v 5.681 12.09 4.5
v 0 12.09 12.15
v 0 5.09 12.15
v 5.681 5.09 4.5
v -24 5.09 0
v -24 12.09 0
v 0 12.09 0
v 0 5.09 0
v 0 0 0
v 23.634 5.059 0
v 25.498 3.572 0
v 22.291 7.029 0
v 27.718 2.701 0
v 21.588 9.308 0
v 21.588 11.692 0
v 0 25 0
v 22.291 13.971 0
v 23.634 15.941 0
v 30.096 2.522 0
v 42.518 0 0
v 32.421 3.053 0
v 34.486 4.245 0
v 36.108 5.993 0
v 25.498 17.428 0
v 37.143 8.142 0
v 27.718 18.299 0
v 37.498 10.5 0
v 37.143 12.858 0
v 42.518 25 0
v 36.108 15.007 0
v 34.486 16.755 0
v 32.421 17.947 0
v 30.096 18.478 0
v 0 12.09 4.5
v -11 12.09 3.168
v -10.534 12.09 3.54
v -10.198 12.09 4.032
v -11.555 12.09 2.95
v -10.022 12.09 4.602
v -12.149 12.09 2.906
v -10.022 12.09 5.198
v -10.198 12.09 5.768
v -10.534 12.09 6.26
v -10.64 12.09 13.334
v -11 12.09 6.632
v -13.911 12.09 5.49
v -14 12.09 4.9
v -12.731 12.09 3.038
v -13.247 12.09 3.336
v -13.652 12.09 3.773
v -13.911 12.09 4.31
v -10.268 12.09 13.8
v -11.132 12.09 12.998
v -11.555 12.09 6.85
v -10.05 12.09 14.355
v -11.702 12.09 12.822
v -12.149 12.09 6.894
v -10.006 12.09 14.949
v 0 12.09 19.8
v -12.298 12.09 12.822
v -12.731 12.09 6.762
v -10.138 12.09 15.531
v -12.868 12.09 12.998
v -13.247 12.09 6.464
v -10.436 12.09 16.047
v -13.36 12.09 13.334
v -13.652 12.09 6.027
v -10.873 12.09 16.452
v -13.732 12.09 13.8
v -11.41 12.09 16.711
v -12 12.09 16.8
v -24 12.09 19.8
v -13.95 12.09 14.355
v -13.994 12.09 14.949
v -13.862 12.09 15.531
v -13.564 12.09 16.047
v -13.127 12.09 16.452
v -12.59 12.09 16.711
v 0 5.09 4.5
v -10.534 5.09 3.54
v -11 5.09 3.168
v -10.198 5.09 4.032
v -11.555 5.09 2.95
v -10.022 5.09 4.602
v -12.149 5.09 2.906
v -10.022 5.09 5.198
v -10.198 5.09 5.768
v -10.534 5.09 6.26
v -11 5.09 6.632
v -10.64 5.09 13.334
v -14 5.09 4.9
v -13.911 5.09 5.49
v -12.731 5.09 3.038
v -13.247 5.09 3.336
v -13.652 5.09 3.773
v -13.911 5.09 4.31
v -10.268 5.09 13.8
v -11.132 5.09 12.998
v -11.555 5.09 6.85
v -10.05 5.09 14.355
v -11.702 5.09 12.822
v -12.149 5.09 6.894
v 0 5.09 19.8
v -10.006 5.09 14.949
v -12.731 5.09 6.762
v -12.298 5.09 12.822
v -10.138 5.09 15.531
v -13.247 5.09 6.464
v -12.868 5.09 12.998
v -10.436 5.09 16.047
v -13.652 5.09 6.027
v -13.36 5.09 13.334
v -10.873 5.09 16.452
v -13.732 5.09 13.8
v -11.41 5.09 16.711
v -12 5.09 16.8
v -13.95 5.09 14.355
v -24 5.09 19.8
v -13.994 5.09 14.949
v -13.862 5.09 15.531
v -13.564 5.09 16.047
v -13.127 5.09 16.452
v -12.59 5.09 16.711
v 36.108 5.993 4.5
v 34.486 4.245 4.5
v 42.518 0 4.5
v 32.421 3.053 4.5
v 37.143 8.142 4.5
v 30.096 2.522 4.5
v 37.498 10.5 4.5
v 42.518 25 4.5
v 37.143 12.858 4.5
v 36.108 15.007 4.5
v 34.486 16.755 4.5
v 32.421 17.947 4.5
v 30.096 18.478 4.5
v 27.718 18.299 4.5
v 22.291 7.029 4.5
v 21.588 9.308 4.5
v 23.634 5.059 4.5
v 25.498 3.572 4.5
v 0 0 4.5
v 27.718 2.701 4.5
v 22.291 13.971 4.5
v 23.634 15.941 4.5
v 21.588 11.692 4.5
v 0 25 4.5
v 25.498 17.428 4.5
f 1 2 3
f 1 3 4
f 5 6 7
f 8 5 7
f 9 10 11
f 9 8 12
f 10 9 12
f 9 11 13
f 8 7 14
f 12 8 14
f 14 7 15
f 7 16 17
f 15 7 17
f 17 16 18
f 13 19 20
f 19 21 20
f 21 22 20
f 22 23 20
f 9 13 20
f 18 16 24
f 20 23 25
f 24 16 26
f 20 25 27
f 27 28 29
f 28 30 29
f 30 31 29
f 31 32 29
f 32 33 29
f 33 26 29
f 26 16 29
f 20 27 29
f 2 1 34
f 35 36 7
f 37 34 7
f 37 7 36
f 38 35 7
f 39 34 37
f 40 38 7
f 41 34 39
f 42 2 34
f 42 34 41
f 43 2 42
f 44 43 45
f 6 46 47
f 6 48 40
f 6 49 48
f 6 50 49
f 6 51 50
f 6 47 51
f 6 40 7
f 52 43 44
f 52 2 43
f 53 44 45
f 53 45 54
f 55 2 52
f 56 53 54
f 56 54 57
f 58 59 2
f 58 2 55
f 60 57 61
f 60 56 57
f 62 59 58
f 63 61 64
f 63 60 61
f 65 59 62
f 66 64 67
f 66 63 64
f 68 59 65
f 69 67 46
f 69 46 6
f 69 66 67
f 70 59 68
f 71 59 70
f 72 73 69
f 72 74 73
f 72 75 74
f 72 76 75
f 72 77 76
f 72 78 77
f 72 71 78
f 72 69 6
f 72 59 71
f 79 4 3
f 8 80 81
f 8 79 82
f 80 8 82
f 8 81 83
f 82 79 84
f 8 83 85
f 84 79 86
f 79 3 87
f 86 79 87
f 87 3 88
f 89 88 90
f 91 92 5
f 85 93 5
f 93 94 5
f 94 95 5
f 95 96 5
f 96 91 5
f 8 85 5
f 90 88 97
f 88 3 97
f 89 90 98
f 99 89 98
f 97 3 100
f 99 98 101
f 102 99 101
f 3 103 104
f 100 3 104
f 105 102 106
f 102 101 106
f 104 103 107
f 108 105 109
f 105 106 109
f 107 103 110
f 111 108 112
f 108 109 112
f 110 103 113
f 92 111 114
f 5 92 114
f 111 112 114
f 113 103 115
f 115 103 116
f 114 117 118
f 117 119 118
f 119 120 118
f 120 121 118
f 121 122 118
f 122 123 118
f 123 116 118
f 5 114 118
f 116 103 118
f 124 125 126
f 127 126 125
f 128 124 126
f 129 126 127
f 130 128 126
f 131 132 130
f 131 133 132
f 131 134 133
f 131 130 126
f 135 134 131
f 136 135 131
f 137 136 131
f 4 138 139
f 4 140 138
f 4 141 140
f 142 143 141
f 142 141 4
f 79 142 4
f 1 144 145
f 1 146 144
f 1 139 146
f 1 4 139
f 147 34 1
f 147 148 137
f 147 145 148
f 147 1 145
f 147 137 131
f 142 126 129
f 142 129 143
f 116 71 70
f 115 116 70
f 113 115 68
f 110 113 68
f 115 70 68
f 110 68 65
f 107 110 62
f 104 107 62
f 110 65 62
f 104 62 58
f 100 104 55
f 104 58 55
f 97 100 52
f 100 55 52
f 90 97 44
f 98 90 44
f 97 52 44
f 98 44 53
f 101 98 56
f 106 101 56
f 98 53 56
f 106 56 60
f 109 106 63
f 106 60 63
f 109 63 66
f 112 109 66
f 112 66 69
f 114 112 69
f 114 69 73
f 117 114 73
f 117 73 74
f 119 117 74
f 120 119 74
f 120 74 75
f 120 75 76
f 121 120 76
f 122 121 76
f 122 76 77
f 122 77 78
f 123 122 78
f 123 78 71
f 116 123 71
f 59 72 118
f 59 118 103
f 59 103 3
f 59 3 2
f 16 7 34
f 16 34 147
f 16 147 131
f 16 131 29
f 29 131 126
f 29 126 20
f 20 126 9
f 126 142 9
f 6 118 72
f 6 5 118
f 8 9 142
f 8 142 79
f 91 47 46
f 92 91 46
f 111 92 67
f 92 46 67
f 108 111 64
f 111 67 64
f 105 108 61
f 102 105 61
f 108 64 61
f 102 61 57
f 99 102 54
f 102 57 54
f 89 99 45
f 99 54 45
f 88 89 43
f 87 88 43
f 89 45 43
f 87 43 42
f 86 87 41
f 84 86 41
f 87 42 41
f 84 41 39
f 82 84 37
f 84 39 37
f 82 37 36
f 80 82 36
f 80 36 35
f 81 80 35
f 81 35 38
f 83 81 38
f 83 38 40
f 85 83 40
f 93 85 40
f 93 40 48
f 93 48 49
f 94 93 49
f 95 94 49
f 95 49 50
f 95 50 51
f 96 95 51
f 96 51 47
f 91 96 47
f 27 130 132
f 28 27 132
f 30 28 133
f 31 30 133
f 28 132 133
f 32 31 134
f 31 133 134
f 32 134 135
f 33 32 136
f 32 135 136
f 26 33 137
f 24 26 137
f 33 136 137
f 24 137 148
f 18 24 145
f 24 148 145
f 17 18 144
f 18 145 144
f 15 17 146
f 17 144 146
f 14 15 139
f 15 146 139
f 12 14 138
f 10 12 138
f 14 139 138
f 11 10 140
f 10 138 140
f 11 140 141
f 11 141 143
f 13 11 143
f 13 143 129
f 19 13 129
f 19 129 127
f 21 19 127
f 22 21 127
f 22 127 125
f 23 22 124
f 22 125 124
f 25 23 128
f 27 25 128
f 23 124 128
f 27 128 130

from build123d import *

# Parameters (mm, degrees)
SKETCH1_R                 = 11
SKETCH1_R_2               = 8
BOSS_EXTRUDE1_DEPTH       = 4.8
SKETCH2_W                 = 44.821432693
SKETCH2_H                 = 40.097165435
SKETCH2_R                 = 11
BOSS_EXTRUDE2_DEPTH       = 8.2
SKETCH3_W                 = 24
SKETCH3_H                 = 15
SKETCH3_R                 = 8
BOSS_EXTRUDE3_DEPTH       = 5
BOSS_EXTRUDE4_OUTLINE_W   = 48.178567307
BOSS_EXTRUDE4_OUTLINE_H   = 40.5
BOSS_EXTRUDE4_OUTLINE_R   = 1.6
BOSS_EXTRUDE4_OUTLINE_R_2 = 6.35
BOSS_EXTRUDE4_OUTLINE_R_3 = 2.1
BOSS_EXTRUDE4_DEPTH       = 5
BOSS_EXTRUDE5_DEPTH       = 5
SKETCH6_W                 = 48.178567307
SKETCH6_H                 = 17.568704936
BOSS_EXTRUDE6_DEPTH       = 5
SKETCH8_R                 = 2
CUT_EXTRUDE1_DEPTH        = 127.437257167
CUT_EXTRUDE2_START        = -23.95
CUT_EXTRUDE2_OUTLINE_W    = 64.98154514
CUT_EXTRUDE2_OUTLINE_H    = 102.7
CUT_EXTRUDE2_OUTLINE_R    = 11
CUT_EXTRUDE2_DEPTH        = 23.95
CUT_EXTRUDE2_START_2      = -45.3
CUT_EXTRUDE2_2_DEPTH      = 21.35
SKETCH13_W                = 48.029963693
SKETCH13_H                = 72.7
CUT_EXTRUDE5_DEPTH        = 100
SKETCH14_W                = 52.01845486
SKETCH14_H                = 5
CUT_EXTRUDE6_DEPTH        = 100
SKETCH15_W                = 24
SKETCH15_H                = 10
BOSS_EXTRUDE7_DEPTH       = 10
SKETCH16_R                = 2
CUT_EXTRUDE7_DEPTH        = 30
SKETCH17_W                = 28.01845486
SKETCH17_H                = 5.3
CUT_EXTRUDE11_DEPTH       = 100
SKETCH18_W                = 24
SKETCH18_H                = 4.59
CUT_EXTRUDE12_DEPTH       = 43.450839953
SKETCH19_W                = 4.5
SKETCH19_H                = 7
BOSS_EXTRUDE8_DEPTH       = 24
SKETCH20_W                = 24
SKETCH20_H                = 7
BOSS_EXTRUDE9_DEPTH       = 15.3
SKETCH21_R                = 2
CUT_EXTRUDE13_DEPTH       = 39
SKETCH22_W                = 24
SKETCH22_H                = 5.41
CUT_EXTRUDE14_DEPTH       = 39
BOSS_EXTRUDE11_START      = -7
BOSS_EXTRUDE11_DEPTH      = 7
SKETCH26_W                = 4.5
SKETCH26_H                = 25
BOSS_EXTRUDE12_DEPTH      = 14.5
BOSS_EXTRUDE13_START      = -4.5
SKETCH27_R                = 8
BOSS_EXTRUDE13_DEPTH      = 4.5
SKETCH28_R                = 8
CUT_EXTRUDE15_DEPTH       = 4.5


# Read off the part's stored shape, not the designer's step: Boss-Extrude4, Cut-Extrude2
with BuildPart() as part:
    # Sketch1 → Boss-Extrude1 (new body)
    # profile 1 of 2: a face of its own
    with BuildSketch(Plane.XY):
        Polygon((0, 0), (93, 0), (93, 102.7), (0, 102.7), (0, 30), (-24, 30), (-24, 15), (0, 15), align=None)
        with Locations((15, 10.5)):
            Circle(SKETCH1_R, mode=Mode.SUBTRACT)
        with Locations((70, 72)):
            Circle(SKETCH1_R, mode=Mode.SUBTRACT)
    # profile 2 of 2: a face of its own
    with BuildSketch(Plane.XY):
        with BuildLine():
            ThreePointArc((26, 10.5), (8.48332569, 19.36188219), (11.721280738, 0))
            Line((11.721280738, 0), (18.278719262, 0))
            ThreePointArc((18.278719262, 0), (23.86188219, 3.98332569), (26, 10.5))
        make_face()
        with Locations((15, 10.5)):
            Circle(SKETCH1_R_2, mode=Mode.SUBTRACT)
    extrude(amount=BOSS_EXTRUDE1_DEPTH)

    # Sketch2 → Boss-Extrude2 (add)
    with BuildSketch(Plane.XY.offset(4.8)):
        with Locations((70.589283654, 72.714594712)):
            Rectangle(SKETCH2_W, SKETCH2_H)
        with Locations((70, 72)):
            Circle(SKETCH2_R, mode=Mode.SUBTRACT)
    extrude(amount=BOSS_EXTRUDE2_DEPTH)

    # Sketch3 → Boss-Extrude3 (add)
    # profile 1 of 2: a face of its own
    with BuildSketch(Plane.XY.offset(4.8)):
        with Locations((-12, 22.5)):
            Rectangle(SKETCH3_W, SKETCH3_H)
    # profile 2 of 2: a face of its own
    with BuildSketch(Plane.XY.offset(4.8)):
        Polygon((0, 30), (0, 15), (0, 0), (93, 0), (93, 52.666011994), (48.178567307, 52.666011994), (0, 52.666011994), align=None)
        with Locations((15, 10.5)):
            Circle(SKETCH3_R, mode=Mode.SUBTRACT)
    extrude(amount=BOSS_EXTRUDE3_DEPTH)

    # Boss-Extrude4 outline → Boss-Extrude4 (add)
    # profile 1 of 2: a face of its own
    with BuildSketch(Plane.XZ.offset(-75.23471693)):
        with Locations((24.089283654, 25.05)):
            Rectangle(BOSS_EXTRUDE4_OUTLINE_W, BOSS_EXTRUDE4_OUTLINE_H)
        with Locations((22.860422048, 23.3)):
            Circle(BOSS_EXTRUDE4_OUTLINE_R, mode=Mode.SUBTRACT)
        with Locations((38.360422048, 30.3)):
            Circle(BOSS_EXTRUDE4_OUTLINE_R_2, mode=Mode.SUBTRACT)
        with Locations((30.610422048, 36.723393759)):
            Circle(BOSS_EXTRUDE4_OUTLINE_R, mode=Mode.SUBTRACT)
        with Locations((46.110422048, 36.723393759)):
            Circle(BOSS_EXTRUDE4_OUTLINE_R, mode=Mode.SUBTRACT)
    # profile 2 of 2: a face of its own
    with BuildSketch(Plane.XZ.offset(-75.23471693)):
        with Locations((51.783815806, 31.05)):
            Circle(BOSS_EXTRUDE4_OUTLINE_R_3)
    extrude(amount=BOSS_EXTRUDE4_DEPTH)

    # Sketch5 → Boss-Extrude5 (add)
    with BuildSketch(Plane(origin=(48.178567307, 0, 0), x_dir=(0, 0, -1), z_dir=(1, 0, 0))):
        Polygon((-45.3, 75.23471693), (-13, 92.763177429), (-4.8, 92.763177429), (-4.8, 70.23471693), (-45.3, 70.23471693), align=None)
    extrude(amount=-BOSS_EXTRUDE5_DEPTH)

    # Sketch6 → Boss-Extrude6 (add)
    with BuildSketch(Plane.XY.offset(4.8)):
        with Locations((24.089283654, 61.450364462)):
            Rectangle(SKETCH6_W, SKETCH6_H)
    extrude(amount=BOSS_EXTRUDE6_DEPTH)

    # Sketch8 → Cut-Extrude1 (cut, through all)
    with BuildSketch(Plane(origin=(0, 30, 0), x_dir=(1, 0, 0), z_dir=(0, 1, 0))):
        with Locations(Location((-12, -4.9, 0), (0, 0, 180))):
            Circle(SKETCH8_R)
    extrude(amount=-CUT_EXTRUDE1_DEPTH, mode=Mode.SUBTRACT)

    # Cut-Extrude2 outline → Cut-Extrude2 (cut)
    with BuildSketch(Plane(origin=(0, 0, 0), x_dir=(-1, 0, 0), z_dir=(0, 0, -1)).offset(CUT_EXTRUDE2_START)):
        with Locations((-60.50922743, 51.35)):
            Rectangle(CUT_EXTRUDE2_OUTLINE_W, CUT_EXTRUDE2_OUTLINE_H)
        with Locations((-70, 72)):
            Circle(CUT_EXTRUDE2_OUTLINE_R, mode=Mode.SUBTRACT)
    extrude(amount=CUT_EXTRUDE2_DEPTH, mode=Mode.SUBTRACT)

    # Cut-Extrude2 2 outline → Cut-Extrude2 2 (cut)
    with BuildSketch(Plane(origin=(0, 0, 0), x_dir=(-1, 0, 0), z_dir=(0, 0, -1)).offset(CUT_EXTRUDE2_START_2)):
        Polygon((-28.01845486, 70.23471693), (-28.01845486, 75.23471693), (-43.178567307, 75.23471693), (-43.178567307, 92.763177429), (-48.178567307, 92.763177429), (-48.178567307, 70.23471693), align=None)
    extrude(amount=CUT_EXTRUDE2_2_DEPTH, mode=Mode.SUBTRACT)

    # Sketch13 → Cut-Extrude5 (cut)
    with BuildSketch(Plane.ZY):
        with Locations((24.014981847, 66.35)):
            Rectangle(SKETCH13_W, SKETCH13_H)
    extrude(amount=-CUT_EXTRUDE5_DEPTH, mode=Mode.SUBTRACT)

    # Sketch14 → Cut-Extrude6 (cut)
    with BuildSketch(Plane.XY.offset(9.8)):
        with Locations((2.00922743, 27.5)):
            Rectangle(SKETCH14_W, SKETCH14_H)
    extrude(amount=-CUT_EXTRUDE6_DEPTH, mode=Mode.SUBTRACT)

    # Sketch15 → Boss-Extrude7 (add)
    with BuildSketch(Plane.XY.offset(9.8)):
        with Locations((-12, 20)):
            Rectangle(SKETCH15_W, SKETCH15_H)
    extrude(amount=BOSS_EXTRUDE7_DEPTH)

    # Sketch16 → Cut-Extrude7 (cut)
    with BuildSketch(Plane(origin=(0, 25, 0), x_dir=(1, 0, 0), z_dir=(0, 1, 0))):
        with Locations(Location((-12, -14.8, 0), (0, 0, 270))):
            Circle(SKETCH16_R)
    extrude(amount=-CUT_EXTRUDE7_DEPTH, mode=Mode.SUBTRACT)

    # Sketch17 → Cut-Extrude11 (cut)
    with BuildSketch(Plane(origin=(0, 25, 0), x_dir=(1, 0, 0), z_dir=(0, 1, 0))):
        with Locations((14.00922743, -7.15)):
            Rectangle(SKETCH17_W, SKETCH17_H)
    extrude(amount=-CUT_EXTRUDE11_DEPTH, mode=Mode.SUBTRACT)

    # Sketch18 → Cut-Extrude12 (cut, through all)
    with BuildSketch(Plane(origin=(0, 0, 0), x_dir=(-1, 0, 0), z_dir=(0, 0, -1))):
        with Locations((12, 17.295)):
            Rectangle(SKETCH18_W, SKETCH18_H)
    extrude(amount=-CUT_EXTRUDE12_DEPTH, mode=Mode.SUBTRACT)

    # Sketch19 → Boss-Extrude8 (add)
    with BuildSketch(Plane.ZY):
        with Locations((2.25, 8.59)):
            Rectangle(SKETCH19_W, SKETCH19_H)
    extrude(amount=BOSS_EXTRUDE8_DEPTH)

    # Sketch20 → Boss-Extrude9 (add)
    with BuildSketch(Plane.XY.offset(4.5)):
        with Locations((-12, 8.59)):
            Rectangle(SKETCH20_W, SKETCH20_H)
    extrude(amount=BOSS_EXTRUDE9_DEPTH)

    # Sketch21 → Cut-Extrude13 (cut)
    with BuildSketch(Plane(origin=(0, 25, 0), x_dir=(1, 0, 0), z_dir=(0, 1, 0))):
        with Locations(Location((-12, -4.9, 0), (0, 0, 180))):
            Circle(SKETCH21_R)
        with Locations(Location((-12, -14.8, 0), (0, 0, 270))):
            Circle(SKETCH21_R)
    extrude(amount=-CUT_EXTRUDE13_DEPTH, mode=Mode.SUBTRACT)

    # Sketch22 → Cut-Extrude14 (cut)
    with BuildSketch(Plane(origin=(0, 0, 0), x_dir=(-1, 0, 0), z_dir=(0, 0, -1))):
        with Locations((12, 22.295)):
            Rectangle(SKETCH22_W, SKETCH22_H)
    extrude(amount=-CUT_EXTRUDE14_DEPTH, mode=Mode.SUBTRACT)

    # Sketch25 → Boss-Extrude11 (add)
    with BuildSketch(Plane.XZ.offset(-5.09).offset(BOSS_EXTRUDE11_START)):
        Polygon((0, 4.5), (0, 12.15), (5.681243584, 4.5), align=None)
    extrude(amount=BOSS_EXTRUDE11_DEPTH)

    # Sketch26 → Boss-Extrude12 (add)
    with BuildSketch(Plane(origin=(28.01845486, 0, 0), x_dir=(0, 0, -1), z_dir=(1, 0, 0))):
        with Locations((-2.25, 12.5)):
            Rectangle(SKETCH26_W, SKETCH26_H)
    extrude(amount=BOSS_EXTRUDE12_DEPTH)

    # Sketch27 → Boss-Extrude13 (add)
    with BuildSketch(Plane.XY.offset(4.5).offset(BOSS_EXTRUDE13_START)):
        with Locations((15, 10.5)):
            Circle(SKETCH27_R)
    extrude(amount=BOSS_EXTRUDE13_DEPTH)

    # Sketch28 → Cut-Extrude15 (cut)
    with BuildSketch(Plane.XY.offset(4.5)):
        with Locations((29.49845486, 10.5)):
            Circle(SKETCH28_R)
    extrude(amount=-CUT_EXTRUDE15_DEPTH, mode=Mode.SUBTRACT)


solid = part.part
